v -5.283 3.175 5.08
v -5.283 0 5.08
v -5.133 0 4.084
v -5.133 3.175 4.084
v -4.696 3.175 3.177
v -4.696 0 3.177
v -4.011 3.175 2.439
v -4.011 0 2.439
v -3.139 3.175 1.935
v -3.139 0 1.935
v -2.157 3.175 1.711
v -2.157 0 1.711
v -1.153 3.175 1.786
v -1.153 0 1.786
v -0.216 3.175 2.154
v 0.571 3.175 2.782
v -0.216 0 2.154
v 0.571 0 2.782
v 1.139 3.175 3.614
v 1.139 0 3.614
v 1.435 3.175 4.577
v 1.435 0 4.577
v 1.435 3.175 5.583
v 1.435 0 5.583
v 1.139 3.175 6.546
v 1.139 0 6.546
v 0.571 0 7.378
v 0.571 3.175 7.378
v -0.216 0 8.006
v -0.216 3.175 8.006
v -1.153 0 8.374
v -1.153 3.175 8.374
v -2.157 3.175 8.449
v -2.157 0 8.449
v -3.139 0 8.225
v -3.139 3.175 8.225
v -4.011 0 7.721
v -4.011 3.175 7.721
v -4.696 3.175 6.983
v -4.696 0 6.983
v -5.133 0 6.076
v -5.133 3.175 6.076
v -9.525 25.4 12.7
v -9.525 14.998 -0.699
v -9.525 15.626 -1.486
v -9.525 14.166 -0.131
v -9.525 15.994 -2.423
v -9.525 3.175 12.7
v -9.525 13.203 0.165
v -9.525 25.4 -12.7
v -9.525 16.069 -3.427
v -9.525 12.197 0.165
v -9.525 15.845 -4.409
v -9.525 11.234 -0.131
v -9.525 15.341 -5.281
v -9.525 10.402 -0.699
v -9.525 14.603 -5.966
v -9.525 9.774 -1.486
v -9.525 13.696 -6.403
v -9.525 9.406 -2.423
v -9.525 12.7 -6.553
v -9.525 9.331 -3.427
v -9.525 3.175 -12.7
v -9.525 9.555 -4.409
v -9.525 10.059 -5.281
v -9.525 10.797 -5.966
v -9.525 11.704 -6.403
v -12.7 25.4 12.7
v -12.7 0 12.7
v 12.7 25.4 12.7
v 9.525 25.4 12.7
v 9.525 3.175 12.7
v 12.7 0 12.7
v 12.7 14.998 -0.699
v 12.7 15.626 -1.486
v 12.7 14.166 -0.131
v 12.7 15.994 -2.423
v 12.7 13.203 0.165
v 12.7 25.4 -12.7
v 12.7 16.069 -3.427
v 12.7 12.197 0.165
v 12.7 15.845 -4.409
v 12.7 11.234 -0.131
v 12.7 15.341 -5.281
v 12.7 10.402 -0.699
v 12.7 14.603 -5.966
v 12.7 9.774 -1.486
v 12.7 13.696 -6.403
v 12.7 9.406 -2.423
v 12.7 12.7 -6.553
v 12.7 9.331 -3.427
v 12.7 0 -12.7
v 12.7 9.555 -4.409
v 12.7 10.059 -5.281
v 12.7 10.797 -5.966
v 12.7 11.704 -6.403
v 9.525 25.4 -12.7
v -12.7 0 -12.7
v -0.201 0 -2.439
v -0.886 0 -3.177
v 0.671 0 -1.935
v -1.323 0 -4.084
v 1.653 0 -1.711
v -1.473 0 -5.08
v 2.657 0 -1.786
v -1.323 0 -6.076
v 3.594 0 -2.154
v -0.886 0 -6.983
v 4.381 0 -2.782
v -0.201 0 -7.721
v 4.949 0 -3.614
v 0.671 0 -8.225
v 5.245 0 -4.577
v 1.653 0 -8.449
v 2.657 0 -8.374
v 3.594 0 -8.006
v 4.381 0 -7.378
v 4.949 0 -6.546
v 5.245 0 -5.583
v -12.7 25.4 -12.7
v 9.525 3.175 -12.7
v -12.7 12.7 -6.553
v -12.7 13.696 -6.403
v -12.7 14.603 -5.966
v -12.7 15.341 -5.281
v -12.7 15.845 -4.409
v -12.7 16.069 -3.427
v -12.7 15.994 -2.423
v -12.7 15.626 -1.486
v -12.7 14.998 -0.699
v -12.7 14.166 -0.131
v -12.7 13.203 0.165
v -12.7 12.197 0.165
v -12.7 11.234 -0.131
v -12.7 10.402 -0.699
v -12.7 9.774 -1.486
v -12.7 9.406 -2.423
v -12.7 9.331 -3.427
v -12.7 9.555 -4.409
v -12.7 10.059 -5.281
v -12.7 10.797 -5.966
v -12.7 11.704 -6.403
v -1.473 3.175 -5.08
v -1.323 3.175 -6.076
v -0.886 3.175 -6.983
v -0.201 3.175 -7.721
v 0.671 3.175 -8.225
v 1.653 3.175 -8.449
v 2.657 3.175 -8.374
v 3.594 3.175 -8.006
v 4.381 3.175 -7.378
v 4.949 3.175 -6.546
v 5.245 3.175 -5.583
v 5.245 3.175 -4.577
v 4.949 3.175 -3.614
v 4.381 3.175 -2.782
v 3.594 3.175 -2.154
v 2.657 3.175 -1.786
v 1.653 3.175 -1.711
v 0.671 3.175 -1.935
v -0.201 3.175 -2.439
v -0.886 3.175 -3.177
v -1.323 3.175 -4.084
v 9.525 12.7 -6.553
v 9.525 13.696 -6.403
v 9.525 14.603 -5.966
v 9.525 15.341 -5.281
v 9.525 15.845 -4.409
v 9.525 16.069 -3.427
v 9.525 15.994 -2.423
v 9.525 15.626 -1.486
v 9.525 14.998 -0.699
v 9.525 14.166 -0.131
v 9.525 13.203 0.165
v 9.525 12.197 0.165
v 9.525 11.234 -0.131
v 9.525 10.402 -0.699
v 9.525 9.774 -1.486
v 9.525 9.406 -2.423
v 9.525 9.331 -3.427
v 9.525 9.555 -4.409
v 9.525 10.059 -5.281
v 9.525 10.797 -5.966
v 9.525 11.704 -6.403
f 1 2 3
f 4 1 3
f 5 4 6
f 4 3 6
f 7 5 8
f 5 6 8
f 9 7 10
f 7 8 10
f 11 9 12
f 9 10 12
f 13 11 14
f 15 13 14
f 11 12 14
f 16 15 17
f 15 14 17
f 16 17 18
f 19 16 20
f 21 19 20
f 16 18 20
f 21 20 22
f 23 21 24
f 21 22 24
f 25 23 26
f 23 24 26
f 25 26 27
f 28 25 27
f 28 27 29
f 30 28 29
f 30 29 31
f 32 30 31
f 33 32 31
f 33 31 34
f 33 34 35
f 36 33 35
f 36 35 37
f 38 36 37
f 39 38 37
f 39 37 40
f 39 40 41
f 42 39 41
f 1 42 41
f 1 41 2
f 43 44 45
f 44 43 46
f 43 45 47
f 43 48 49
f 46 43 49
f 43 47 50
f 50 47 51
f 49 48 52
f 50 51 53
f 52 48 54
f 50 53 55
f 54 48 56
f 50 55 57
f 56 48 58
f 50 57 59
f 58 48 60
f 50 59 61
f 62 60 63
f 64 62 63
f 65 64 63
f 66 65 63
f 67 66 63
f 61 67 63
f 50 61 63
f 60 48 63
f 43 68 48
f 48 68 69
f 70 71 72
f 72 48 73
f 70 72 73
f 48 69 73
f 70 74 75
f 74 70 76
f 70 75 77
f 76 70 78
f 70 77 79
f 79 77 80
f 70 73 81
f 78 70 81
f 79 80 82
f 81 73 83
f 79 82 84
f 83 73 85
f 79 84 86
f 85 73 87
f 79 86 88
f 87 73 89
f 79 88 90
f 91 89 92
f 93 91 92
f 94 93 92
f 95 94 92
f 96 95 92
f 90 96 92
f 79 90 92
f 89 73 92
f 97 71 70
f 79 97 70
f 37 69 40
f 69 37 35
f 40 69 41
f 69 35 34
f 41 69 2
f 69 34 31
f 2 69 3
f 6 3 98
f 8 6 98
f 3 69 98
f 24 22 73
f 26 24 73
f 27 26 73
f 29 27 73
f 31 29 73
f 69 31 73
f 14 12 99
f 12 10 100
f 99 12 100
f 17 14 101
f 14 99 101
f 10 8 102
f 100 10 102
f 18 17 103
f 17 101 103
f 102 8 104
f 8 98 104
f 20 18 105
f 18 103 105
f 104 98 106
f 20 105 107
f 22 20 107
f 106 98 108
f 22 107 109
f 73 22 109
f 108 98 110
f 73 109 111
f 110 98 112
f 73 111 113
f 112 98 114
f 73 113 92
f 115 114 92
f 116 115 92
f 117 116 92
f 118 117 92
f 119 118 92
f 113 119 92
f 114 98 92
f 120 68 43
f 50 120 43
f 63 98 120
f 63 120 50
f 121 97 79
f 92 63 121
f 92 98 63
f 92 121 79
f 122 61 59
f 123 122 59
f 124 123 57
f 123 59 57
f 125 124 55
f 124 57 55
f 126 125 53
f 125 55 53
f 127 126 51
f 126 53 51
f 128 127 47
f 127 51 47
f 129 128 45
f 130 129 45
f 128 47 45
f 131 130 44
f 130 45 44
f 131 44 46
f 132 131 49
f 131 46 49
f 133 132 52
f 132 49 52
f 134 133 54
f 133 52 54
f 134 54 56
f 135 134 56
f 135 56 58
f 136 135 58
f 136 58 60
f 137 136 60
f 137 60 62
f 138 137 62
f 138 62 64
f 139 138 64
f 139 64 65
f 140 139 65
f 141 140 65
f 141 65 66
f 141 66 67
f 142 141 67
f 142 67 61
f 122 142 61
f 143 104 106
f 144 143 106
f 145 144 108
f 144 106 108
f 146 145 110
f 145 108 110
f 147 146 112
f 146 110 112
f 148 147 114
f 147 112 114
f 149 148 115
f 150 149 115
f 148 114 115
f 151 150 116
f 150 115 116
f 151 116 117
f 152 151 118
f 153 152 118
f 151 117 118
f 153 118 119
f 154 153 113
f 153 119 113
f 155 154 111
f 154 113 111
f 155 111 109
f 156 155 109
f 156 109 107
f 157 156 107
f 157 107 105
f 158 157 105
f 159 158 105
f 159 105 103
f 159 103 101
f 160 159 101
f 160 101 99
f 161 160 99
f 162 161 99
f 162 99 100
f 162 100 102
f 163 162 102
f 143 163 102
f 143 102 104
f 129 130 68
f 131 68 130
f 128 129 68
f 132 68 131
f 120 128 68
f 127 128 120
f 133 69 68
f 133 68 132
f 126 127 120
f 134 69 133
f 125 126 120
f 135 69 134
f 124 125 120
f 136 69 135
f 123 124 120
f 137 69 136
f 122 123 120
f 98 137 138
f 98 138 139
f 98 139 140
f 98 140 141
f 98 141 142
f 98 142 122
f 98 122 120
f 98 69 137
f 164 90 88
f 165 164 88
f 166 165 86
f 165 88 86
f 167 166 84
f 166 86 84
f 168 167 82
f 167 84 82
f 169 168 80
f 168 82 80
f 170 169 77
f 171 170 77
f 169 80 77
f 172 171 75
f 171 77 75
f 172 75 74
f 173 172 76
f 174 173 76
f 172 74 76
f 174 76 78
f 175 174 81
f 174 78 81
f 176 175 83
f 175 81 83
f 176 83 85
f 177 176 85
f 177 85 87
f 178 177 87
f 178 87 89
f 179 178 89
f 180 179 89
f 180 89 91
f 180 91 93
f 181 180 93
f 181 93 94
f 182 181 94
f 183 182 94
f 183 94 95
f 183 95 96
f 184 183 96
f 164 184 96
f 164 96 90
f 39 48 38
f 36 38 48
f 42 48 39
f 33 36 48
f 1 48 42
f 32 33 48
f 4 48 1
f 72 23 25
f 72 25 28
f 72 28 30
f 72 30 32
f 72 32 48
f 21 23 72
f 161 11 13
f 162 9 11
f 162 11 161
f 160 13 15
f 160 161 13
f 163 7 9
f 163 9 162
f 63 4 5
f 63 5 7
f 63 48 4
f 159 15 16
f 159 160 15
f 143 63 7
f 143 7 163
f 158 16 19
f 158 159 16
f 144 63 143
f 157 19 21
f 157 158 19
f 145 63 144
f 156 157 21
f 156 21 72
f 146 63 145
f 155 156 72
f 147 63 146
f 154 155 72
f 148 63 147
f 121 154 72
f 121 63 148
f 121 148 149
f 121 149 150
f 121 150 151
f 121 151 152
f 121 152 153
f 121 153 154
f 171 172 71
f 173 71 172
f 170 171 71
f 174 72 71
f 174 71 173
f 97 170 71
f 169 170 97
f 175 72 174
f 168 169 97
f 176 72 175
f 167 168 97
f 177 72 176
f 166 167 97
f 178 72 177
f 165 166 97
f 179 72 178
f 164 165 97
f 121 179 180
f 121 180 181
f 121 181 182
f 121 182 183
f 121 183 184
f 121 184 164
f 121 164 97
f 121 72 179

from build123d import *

# Parameters (mm, degrees)
SKETCH1_W               = 25.4
SKETCH1_H               = 25.4
BOSS_EXTRUDE1_DEPTH     = 3.175
SKETCH2_W               = 3.175
SKETCH2_H               = 25.4
BOSS_EXTRUDE2_DEPTH     = 22.225
F_1_4_CLEARANCE_HOLE2_D = 6.7564
F_1_4_CLEARANCE_HOLE1_D = 6.7564


with BuildPart() as part:
    # Sketch1 → Boss-Extrude1 (new body)
    with BuildSketch(Plane(origin=(0, 0, 0), x_dir=(1, 0, 0), z_dir=(0, 1, 0))):
        Rectangle(SKETCH1_W, SKETCH1_H)
    extrude(amount=BOSS_EXTRUDE1_DEPTH)

    # Sketch2 → Boss-Extrude2 (add)
    with BuildSketch(Plane(origin=(0, 3.175, 0), x_dir=(1, 0, 0), z_dir=(0, 1, 0))):
        with Locations((-11.1125, 0)):
            Rectangle(SKETCH2_W, SKETCH2_H)
        with Locations((11.1125, 0)):
            Rectangle(SKETCH2_W, SKETCH2_H)
    extrude(amount=BOSS_EXTRUDE2_DEPTH)

    # 1/4 Clearance Hole2 (through all)
    with Locations(Plane(origin=(0, 3.175, 0), x_dir=(1, 0, 0), z_dir=(0, 1, 0))):
        with Locations((1.905, 5.08), (-1.905, -5.08)):
            Hole(F_1_4_CLEARANCE_HOLE2_D / 2)

    # 1/4 Clearance Hole1 (through all)
    with Locations(Plane.ZY.offset(12.7)):
        with Locations((-3.175, 12.7)):
            Hole(F_1_4_CLEARANCE_HOLE1_D / 2)


solid = part.part
